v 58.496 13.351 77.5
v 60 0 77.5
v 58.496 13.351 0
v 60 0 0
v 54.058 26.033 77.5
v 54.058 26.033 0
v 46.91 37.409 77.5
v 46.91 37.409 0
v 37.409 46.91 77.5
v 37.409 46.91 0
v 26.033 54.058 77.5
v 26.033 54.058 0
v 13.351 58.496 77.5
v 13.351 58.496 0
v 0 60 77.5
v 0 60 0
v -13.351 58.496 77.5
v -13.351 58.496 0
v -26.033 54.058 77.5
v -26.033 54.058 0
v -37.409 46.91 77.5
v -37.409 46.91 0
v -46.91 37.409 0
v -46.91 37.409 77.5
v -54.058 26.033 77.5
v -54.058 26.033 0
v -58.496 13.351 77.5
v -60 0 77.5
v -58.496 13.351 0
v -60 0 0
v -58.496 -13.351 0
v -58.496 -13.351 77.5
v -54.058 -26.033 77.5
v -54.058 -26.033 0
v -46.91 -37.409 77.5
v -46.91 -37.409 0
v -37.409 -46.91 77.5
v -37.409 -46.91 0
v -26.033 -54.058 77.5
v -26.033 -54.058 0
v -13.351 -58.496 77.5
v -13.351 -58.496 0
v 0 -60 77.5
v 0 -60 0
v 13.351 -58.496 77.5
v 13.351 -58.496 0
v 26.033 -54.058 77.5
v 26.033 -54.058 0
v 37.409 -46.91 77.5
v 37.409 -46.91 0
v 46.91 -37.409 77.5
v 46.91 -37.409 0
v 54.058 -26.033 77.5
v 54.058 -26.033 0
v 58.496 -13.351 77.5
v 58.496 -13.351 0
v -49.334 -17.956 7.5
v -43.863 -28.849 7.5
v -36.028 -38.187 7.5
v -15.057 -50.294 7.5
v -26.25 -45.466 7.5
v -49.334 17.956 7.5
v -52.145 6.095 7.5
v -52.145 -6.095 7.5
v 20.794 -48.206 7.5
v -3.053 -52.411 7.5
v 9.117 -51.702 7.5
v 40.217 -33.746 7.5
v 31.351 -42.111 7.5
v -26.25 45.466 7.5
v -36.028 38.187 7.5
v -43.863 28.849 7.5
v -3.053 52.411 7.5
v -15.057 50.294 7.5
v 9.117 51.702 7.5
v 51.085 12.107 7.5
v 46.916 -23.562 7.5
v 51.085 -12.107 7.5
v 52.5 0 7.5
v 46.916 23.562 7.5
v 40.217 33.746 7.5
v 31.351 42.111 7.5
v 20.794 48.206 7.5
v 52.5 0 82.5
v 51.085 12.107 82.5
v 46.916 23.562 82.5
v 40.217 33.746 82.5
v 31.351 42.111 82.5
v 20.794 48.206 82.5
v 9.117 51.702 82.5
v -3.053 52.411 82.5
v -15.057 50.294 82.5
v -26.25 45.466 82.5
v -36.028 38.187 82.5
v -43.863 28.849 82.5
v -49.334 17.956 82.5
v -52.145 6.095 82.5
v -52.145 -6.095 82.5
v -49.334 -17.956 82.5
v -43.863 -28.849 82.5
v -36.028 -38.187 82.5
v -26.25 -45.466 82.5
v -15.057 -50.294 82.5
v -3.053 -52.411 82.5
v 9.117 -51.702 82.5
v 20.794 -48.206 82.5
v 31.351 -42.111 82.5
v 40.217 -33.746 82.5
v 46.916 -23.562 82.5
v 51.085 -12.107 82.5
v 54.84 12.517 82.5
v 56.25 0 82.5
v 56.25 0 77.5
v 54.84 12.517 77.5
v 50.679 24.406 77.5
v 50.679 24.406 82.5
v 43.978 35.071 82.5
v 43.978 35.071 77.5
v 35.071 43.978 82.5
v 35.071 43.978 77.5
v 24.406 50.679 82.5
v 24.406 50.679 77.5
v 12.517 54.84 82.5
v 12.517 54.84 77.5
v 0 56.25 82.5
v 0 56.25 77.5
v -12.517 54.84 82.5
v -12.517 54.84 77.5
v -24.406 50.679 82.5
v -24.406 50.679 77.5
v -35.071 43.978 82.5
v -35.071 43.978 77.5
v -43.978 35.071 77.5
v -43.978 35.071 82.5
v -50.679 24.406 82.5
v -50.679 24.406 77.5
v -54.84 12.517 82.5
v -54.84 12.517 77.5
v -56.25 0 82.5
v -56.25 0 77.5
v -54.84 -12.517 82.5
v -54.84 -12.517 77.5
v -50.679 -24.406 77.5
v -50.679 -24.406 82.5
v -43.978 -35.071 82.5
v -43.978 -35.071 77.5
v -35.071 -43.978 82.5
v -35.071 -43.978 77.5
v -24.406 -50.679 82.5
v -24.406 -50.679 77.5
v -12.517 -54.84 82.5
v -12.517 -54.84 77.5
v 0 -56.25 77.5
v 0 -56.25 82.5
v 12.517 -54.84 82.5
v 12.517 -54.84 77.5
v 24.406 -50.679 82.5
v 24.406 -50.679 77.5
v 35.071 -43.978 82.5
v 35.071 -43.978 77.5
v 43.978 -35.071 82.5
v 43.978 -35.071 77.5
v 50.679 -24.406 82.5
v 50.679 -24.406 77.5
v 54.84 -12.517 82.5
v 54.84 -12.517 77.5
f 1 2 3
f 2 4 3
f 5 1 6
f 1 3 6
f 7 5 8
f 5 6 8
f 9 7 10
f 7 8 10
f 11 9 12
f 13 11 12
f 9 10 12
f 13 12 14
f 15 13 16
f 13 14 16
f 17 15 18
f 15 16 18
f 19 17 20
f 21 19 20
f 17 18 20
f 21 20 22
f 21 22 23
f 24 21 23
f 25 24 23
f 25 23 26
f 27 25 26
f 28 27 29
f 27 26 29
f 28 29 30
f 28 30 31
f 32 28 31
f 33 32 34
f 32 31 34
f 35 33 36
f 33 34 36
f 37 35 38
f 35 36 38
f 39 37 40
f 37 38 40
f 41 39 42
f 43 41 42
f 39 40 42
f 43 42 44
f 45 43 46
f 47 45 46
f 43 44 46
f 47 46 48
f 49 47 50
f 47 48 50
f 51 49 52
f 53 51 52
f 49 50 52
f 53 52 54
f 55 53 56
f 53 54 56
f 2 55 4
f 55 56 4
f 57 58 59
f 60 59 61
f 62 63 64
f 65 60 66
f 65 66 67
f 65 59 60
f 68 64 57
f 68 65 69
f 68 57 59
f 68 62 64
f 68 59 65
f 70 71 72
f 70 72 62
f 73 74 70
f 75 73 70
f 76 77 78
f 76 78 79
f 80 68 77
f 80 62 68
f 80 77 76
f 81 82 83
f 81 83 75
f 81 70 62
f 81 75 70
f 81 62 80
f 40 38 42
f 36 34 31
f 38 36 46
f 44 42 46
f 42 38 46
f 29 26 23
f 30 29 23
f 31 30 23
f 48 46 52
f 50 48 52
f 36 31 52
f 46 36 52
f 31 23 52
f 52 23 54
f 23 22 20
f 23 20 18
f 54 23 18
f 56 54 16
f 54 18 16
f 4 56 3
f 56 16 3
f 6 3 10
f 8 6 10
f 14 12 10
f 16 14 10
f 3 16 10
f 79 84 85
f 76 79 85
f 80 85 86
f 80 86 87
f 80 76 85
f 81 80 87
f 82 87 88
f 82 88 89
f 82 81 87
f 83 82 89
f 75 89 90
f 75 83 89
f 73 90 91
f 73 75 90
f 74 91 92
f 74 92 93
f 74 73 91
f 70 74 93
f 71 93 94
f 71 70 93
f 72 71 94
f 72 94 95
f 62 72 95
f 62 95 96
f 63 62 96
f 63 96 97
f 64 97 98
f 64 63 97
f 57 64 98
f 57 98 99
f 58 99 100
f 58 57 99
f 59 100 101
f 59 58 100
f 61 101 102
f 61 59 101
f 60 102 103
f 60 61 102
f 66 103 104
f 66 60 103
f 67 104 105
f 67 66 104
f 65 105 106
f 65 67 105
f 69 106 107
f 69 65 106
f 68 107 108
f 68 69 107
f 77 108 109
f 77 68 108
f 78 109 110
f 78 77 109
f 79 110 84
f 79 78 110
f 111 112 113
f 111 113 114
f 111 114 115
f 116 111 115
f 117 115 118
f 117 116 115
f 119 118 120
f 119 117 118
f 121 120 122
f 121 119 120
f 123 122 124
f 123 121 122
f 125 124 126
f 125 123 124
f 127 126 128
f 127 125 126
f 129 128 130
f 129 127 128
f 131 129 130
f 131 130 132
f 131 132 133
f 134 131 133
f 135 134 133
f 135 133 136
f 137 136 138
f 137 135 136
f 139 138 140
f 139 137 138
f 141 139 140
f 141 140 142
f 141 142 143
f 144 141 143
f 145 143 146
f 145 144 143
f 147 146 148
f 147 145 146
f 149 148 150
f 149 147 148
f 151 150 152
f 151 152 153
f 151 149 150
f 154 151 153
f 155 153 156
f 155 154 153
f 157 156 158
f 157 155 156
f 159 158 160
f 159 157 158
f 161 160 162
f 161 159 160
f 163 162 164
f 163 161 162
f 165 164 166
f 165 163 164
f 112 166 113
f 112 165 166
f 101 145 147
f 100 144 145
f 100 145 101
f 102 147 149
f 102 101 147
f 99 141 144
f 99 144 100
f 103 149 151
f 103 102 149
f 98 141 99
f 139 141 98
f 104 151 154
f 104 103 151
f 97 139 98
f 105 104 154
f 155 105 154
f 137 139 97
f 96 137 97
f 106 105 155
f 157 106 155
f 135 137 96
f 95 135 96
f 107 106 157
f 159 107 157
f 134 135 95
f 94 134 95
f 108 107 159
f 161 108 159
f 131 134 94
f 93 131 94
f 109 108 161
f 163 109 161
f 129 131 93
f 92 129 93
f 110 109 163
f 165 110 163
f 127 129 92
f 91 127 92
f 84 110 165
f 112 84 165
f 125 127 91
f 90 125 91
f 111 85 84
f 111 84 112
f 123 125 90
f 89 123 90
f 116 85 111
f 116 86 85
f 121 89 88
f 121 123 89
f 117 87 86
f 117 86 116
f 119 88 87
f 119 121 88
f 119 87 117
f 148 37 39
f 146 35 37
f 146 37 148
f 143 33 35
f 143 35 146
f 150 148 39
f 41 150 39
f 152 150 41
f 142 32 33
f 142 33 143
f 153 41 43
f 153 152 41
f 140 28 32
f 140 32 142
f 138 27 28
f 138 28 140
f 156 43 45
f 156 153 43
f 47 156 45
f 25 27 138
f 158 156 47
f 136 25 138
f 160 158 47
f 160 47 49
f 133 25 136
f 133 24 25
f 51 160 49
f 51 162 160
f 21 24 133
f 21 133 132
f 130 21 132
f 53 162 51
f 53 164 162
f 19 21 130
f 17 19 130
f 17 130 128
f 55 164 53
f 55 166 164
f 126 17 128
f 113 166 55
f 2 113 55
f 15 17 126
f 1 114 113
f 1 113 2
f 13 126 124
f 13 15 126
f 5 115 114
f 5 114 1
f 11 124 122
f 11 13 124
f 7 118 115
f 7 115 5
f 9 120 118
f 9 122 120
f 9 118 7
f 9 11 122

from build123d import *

# Parameters (mm, degrees)
F0_R     = 60
F1_DEPTH = 7.5
F2_R     = 60
F2_R_2   = 52.5
F3_DEPTH = 75
F4_R     = 60
F4_R_2   = 56.25
F5_DEPTH = 5


with BuildPart() as f1:
    # F0 (on Top) → F1 (new body)
    with BuildSketch(Plane.XY):
        Circle(F0_R)
    extrude(amount=F1_DEPTH)

    # F2 (on face) → F3 (join)
    with BuildSketch(Plane.XY.offset(7.5)):
        Circle(F2_R)
        Circle(F2_R_2, mode=Mode.SUBTRACT)
    extrude(amount=F3_DEPTH)

    # F4 (on face) → F5 (cut)
    with BuildSketch(Plane.XY.offset(82.5)):
        Circle(F4_R)
        Circle(F4_R_2, mode=Mode.SUBTRACT)
    extrude(amount=-F5_DEPTH, mode=Mode.SUBTRACT)


solid = f1.part
